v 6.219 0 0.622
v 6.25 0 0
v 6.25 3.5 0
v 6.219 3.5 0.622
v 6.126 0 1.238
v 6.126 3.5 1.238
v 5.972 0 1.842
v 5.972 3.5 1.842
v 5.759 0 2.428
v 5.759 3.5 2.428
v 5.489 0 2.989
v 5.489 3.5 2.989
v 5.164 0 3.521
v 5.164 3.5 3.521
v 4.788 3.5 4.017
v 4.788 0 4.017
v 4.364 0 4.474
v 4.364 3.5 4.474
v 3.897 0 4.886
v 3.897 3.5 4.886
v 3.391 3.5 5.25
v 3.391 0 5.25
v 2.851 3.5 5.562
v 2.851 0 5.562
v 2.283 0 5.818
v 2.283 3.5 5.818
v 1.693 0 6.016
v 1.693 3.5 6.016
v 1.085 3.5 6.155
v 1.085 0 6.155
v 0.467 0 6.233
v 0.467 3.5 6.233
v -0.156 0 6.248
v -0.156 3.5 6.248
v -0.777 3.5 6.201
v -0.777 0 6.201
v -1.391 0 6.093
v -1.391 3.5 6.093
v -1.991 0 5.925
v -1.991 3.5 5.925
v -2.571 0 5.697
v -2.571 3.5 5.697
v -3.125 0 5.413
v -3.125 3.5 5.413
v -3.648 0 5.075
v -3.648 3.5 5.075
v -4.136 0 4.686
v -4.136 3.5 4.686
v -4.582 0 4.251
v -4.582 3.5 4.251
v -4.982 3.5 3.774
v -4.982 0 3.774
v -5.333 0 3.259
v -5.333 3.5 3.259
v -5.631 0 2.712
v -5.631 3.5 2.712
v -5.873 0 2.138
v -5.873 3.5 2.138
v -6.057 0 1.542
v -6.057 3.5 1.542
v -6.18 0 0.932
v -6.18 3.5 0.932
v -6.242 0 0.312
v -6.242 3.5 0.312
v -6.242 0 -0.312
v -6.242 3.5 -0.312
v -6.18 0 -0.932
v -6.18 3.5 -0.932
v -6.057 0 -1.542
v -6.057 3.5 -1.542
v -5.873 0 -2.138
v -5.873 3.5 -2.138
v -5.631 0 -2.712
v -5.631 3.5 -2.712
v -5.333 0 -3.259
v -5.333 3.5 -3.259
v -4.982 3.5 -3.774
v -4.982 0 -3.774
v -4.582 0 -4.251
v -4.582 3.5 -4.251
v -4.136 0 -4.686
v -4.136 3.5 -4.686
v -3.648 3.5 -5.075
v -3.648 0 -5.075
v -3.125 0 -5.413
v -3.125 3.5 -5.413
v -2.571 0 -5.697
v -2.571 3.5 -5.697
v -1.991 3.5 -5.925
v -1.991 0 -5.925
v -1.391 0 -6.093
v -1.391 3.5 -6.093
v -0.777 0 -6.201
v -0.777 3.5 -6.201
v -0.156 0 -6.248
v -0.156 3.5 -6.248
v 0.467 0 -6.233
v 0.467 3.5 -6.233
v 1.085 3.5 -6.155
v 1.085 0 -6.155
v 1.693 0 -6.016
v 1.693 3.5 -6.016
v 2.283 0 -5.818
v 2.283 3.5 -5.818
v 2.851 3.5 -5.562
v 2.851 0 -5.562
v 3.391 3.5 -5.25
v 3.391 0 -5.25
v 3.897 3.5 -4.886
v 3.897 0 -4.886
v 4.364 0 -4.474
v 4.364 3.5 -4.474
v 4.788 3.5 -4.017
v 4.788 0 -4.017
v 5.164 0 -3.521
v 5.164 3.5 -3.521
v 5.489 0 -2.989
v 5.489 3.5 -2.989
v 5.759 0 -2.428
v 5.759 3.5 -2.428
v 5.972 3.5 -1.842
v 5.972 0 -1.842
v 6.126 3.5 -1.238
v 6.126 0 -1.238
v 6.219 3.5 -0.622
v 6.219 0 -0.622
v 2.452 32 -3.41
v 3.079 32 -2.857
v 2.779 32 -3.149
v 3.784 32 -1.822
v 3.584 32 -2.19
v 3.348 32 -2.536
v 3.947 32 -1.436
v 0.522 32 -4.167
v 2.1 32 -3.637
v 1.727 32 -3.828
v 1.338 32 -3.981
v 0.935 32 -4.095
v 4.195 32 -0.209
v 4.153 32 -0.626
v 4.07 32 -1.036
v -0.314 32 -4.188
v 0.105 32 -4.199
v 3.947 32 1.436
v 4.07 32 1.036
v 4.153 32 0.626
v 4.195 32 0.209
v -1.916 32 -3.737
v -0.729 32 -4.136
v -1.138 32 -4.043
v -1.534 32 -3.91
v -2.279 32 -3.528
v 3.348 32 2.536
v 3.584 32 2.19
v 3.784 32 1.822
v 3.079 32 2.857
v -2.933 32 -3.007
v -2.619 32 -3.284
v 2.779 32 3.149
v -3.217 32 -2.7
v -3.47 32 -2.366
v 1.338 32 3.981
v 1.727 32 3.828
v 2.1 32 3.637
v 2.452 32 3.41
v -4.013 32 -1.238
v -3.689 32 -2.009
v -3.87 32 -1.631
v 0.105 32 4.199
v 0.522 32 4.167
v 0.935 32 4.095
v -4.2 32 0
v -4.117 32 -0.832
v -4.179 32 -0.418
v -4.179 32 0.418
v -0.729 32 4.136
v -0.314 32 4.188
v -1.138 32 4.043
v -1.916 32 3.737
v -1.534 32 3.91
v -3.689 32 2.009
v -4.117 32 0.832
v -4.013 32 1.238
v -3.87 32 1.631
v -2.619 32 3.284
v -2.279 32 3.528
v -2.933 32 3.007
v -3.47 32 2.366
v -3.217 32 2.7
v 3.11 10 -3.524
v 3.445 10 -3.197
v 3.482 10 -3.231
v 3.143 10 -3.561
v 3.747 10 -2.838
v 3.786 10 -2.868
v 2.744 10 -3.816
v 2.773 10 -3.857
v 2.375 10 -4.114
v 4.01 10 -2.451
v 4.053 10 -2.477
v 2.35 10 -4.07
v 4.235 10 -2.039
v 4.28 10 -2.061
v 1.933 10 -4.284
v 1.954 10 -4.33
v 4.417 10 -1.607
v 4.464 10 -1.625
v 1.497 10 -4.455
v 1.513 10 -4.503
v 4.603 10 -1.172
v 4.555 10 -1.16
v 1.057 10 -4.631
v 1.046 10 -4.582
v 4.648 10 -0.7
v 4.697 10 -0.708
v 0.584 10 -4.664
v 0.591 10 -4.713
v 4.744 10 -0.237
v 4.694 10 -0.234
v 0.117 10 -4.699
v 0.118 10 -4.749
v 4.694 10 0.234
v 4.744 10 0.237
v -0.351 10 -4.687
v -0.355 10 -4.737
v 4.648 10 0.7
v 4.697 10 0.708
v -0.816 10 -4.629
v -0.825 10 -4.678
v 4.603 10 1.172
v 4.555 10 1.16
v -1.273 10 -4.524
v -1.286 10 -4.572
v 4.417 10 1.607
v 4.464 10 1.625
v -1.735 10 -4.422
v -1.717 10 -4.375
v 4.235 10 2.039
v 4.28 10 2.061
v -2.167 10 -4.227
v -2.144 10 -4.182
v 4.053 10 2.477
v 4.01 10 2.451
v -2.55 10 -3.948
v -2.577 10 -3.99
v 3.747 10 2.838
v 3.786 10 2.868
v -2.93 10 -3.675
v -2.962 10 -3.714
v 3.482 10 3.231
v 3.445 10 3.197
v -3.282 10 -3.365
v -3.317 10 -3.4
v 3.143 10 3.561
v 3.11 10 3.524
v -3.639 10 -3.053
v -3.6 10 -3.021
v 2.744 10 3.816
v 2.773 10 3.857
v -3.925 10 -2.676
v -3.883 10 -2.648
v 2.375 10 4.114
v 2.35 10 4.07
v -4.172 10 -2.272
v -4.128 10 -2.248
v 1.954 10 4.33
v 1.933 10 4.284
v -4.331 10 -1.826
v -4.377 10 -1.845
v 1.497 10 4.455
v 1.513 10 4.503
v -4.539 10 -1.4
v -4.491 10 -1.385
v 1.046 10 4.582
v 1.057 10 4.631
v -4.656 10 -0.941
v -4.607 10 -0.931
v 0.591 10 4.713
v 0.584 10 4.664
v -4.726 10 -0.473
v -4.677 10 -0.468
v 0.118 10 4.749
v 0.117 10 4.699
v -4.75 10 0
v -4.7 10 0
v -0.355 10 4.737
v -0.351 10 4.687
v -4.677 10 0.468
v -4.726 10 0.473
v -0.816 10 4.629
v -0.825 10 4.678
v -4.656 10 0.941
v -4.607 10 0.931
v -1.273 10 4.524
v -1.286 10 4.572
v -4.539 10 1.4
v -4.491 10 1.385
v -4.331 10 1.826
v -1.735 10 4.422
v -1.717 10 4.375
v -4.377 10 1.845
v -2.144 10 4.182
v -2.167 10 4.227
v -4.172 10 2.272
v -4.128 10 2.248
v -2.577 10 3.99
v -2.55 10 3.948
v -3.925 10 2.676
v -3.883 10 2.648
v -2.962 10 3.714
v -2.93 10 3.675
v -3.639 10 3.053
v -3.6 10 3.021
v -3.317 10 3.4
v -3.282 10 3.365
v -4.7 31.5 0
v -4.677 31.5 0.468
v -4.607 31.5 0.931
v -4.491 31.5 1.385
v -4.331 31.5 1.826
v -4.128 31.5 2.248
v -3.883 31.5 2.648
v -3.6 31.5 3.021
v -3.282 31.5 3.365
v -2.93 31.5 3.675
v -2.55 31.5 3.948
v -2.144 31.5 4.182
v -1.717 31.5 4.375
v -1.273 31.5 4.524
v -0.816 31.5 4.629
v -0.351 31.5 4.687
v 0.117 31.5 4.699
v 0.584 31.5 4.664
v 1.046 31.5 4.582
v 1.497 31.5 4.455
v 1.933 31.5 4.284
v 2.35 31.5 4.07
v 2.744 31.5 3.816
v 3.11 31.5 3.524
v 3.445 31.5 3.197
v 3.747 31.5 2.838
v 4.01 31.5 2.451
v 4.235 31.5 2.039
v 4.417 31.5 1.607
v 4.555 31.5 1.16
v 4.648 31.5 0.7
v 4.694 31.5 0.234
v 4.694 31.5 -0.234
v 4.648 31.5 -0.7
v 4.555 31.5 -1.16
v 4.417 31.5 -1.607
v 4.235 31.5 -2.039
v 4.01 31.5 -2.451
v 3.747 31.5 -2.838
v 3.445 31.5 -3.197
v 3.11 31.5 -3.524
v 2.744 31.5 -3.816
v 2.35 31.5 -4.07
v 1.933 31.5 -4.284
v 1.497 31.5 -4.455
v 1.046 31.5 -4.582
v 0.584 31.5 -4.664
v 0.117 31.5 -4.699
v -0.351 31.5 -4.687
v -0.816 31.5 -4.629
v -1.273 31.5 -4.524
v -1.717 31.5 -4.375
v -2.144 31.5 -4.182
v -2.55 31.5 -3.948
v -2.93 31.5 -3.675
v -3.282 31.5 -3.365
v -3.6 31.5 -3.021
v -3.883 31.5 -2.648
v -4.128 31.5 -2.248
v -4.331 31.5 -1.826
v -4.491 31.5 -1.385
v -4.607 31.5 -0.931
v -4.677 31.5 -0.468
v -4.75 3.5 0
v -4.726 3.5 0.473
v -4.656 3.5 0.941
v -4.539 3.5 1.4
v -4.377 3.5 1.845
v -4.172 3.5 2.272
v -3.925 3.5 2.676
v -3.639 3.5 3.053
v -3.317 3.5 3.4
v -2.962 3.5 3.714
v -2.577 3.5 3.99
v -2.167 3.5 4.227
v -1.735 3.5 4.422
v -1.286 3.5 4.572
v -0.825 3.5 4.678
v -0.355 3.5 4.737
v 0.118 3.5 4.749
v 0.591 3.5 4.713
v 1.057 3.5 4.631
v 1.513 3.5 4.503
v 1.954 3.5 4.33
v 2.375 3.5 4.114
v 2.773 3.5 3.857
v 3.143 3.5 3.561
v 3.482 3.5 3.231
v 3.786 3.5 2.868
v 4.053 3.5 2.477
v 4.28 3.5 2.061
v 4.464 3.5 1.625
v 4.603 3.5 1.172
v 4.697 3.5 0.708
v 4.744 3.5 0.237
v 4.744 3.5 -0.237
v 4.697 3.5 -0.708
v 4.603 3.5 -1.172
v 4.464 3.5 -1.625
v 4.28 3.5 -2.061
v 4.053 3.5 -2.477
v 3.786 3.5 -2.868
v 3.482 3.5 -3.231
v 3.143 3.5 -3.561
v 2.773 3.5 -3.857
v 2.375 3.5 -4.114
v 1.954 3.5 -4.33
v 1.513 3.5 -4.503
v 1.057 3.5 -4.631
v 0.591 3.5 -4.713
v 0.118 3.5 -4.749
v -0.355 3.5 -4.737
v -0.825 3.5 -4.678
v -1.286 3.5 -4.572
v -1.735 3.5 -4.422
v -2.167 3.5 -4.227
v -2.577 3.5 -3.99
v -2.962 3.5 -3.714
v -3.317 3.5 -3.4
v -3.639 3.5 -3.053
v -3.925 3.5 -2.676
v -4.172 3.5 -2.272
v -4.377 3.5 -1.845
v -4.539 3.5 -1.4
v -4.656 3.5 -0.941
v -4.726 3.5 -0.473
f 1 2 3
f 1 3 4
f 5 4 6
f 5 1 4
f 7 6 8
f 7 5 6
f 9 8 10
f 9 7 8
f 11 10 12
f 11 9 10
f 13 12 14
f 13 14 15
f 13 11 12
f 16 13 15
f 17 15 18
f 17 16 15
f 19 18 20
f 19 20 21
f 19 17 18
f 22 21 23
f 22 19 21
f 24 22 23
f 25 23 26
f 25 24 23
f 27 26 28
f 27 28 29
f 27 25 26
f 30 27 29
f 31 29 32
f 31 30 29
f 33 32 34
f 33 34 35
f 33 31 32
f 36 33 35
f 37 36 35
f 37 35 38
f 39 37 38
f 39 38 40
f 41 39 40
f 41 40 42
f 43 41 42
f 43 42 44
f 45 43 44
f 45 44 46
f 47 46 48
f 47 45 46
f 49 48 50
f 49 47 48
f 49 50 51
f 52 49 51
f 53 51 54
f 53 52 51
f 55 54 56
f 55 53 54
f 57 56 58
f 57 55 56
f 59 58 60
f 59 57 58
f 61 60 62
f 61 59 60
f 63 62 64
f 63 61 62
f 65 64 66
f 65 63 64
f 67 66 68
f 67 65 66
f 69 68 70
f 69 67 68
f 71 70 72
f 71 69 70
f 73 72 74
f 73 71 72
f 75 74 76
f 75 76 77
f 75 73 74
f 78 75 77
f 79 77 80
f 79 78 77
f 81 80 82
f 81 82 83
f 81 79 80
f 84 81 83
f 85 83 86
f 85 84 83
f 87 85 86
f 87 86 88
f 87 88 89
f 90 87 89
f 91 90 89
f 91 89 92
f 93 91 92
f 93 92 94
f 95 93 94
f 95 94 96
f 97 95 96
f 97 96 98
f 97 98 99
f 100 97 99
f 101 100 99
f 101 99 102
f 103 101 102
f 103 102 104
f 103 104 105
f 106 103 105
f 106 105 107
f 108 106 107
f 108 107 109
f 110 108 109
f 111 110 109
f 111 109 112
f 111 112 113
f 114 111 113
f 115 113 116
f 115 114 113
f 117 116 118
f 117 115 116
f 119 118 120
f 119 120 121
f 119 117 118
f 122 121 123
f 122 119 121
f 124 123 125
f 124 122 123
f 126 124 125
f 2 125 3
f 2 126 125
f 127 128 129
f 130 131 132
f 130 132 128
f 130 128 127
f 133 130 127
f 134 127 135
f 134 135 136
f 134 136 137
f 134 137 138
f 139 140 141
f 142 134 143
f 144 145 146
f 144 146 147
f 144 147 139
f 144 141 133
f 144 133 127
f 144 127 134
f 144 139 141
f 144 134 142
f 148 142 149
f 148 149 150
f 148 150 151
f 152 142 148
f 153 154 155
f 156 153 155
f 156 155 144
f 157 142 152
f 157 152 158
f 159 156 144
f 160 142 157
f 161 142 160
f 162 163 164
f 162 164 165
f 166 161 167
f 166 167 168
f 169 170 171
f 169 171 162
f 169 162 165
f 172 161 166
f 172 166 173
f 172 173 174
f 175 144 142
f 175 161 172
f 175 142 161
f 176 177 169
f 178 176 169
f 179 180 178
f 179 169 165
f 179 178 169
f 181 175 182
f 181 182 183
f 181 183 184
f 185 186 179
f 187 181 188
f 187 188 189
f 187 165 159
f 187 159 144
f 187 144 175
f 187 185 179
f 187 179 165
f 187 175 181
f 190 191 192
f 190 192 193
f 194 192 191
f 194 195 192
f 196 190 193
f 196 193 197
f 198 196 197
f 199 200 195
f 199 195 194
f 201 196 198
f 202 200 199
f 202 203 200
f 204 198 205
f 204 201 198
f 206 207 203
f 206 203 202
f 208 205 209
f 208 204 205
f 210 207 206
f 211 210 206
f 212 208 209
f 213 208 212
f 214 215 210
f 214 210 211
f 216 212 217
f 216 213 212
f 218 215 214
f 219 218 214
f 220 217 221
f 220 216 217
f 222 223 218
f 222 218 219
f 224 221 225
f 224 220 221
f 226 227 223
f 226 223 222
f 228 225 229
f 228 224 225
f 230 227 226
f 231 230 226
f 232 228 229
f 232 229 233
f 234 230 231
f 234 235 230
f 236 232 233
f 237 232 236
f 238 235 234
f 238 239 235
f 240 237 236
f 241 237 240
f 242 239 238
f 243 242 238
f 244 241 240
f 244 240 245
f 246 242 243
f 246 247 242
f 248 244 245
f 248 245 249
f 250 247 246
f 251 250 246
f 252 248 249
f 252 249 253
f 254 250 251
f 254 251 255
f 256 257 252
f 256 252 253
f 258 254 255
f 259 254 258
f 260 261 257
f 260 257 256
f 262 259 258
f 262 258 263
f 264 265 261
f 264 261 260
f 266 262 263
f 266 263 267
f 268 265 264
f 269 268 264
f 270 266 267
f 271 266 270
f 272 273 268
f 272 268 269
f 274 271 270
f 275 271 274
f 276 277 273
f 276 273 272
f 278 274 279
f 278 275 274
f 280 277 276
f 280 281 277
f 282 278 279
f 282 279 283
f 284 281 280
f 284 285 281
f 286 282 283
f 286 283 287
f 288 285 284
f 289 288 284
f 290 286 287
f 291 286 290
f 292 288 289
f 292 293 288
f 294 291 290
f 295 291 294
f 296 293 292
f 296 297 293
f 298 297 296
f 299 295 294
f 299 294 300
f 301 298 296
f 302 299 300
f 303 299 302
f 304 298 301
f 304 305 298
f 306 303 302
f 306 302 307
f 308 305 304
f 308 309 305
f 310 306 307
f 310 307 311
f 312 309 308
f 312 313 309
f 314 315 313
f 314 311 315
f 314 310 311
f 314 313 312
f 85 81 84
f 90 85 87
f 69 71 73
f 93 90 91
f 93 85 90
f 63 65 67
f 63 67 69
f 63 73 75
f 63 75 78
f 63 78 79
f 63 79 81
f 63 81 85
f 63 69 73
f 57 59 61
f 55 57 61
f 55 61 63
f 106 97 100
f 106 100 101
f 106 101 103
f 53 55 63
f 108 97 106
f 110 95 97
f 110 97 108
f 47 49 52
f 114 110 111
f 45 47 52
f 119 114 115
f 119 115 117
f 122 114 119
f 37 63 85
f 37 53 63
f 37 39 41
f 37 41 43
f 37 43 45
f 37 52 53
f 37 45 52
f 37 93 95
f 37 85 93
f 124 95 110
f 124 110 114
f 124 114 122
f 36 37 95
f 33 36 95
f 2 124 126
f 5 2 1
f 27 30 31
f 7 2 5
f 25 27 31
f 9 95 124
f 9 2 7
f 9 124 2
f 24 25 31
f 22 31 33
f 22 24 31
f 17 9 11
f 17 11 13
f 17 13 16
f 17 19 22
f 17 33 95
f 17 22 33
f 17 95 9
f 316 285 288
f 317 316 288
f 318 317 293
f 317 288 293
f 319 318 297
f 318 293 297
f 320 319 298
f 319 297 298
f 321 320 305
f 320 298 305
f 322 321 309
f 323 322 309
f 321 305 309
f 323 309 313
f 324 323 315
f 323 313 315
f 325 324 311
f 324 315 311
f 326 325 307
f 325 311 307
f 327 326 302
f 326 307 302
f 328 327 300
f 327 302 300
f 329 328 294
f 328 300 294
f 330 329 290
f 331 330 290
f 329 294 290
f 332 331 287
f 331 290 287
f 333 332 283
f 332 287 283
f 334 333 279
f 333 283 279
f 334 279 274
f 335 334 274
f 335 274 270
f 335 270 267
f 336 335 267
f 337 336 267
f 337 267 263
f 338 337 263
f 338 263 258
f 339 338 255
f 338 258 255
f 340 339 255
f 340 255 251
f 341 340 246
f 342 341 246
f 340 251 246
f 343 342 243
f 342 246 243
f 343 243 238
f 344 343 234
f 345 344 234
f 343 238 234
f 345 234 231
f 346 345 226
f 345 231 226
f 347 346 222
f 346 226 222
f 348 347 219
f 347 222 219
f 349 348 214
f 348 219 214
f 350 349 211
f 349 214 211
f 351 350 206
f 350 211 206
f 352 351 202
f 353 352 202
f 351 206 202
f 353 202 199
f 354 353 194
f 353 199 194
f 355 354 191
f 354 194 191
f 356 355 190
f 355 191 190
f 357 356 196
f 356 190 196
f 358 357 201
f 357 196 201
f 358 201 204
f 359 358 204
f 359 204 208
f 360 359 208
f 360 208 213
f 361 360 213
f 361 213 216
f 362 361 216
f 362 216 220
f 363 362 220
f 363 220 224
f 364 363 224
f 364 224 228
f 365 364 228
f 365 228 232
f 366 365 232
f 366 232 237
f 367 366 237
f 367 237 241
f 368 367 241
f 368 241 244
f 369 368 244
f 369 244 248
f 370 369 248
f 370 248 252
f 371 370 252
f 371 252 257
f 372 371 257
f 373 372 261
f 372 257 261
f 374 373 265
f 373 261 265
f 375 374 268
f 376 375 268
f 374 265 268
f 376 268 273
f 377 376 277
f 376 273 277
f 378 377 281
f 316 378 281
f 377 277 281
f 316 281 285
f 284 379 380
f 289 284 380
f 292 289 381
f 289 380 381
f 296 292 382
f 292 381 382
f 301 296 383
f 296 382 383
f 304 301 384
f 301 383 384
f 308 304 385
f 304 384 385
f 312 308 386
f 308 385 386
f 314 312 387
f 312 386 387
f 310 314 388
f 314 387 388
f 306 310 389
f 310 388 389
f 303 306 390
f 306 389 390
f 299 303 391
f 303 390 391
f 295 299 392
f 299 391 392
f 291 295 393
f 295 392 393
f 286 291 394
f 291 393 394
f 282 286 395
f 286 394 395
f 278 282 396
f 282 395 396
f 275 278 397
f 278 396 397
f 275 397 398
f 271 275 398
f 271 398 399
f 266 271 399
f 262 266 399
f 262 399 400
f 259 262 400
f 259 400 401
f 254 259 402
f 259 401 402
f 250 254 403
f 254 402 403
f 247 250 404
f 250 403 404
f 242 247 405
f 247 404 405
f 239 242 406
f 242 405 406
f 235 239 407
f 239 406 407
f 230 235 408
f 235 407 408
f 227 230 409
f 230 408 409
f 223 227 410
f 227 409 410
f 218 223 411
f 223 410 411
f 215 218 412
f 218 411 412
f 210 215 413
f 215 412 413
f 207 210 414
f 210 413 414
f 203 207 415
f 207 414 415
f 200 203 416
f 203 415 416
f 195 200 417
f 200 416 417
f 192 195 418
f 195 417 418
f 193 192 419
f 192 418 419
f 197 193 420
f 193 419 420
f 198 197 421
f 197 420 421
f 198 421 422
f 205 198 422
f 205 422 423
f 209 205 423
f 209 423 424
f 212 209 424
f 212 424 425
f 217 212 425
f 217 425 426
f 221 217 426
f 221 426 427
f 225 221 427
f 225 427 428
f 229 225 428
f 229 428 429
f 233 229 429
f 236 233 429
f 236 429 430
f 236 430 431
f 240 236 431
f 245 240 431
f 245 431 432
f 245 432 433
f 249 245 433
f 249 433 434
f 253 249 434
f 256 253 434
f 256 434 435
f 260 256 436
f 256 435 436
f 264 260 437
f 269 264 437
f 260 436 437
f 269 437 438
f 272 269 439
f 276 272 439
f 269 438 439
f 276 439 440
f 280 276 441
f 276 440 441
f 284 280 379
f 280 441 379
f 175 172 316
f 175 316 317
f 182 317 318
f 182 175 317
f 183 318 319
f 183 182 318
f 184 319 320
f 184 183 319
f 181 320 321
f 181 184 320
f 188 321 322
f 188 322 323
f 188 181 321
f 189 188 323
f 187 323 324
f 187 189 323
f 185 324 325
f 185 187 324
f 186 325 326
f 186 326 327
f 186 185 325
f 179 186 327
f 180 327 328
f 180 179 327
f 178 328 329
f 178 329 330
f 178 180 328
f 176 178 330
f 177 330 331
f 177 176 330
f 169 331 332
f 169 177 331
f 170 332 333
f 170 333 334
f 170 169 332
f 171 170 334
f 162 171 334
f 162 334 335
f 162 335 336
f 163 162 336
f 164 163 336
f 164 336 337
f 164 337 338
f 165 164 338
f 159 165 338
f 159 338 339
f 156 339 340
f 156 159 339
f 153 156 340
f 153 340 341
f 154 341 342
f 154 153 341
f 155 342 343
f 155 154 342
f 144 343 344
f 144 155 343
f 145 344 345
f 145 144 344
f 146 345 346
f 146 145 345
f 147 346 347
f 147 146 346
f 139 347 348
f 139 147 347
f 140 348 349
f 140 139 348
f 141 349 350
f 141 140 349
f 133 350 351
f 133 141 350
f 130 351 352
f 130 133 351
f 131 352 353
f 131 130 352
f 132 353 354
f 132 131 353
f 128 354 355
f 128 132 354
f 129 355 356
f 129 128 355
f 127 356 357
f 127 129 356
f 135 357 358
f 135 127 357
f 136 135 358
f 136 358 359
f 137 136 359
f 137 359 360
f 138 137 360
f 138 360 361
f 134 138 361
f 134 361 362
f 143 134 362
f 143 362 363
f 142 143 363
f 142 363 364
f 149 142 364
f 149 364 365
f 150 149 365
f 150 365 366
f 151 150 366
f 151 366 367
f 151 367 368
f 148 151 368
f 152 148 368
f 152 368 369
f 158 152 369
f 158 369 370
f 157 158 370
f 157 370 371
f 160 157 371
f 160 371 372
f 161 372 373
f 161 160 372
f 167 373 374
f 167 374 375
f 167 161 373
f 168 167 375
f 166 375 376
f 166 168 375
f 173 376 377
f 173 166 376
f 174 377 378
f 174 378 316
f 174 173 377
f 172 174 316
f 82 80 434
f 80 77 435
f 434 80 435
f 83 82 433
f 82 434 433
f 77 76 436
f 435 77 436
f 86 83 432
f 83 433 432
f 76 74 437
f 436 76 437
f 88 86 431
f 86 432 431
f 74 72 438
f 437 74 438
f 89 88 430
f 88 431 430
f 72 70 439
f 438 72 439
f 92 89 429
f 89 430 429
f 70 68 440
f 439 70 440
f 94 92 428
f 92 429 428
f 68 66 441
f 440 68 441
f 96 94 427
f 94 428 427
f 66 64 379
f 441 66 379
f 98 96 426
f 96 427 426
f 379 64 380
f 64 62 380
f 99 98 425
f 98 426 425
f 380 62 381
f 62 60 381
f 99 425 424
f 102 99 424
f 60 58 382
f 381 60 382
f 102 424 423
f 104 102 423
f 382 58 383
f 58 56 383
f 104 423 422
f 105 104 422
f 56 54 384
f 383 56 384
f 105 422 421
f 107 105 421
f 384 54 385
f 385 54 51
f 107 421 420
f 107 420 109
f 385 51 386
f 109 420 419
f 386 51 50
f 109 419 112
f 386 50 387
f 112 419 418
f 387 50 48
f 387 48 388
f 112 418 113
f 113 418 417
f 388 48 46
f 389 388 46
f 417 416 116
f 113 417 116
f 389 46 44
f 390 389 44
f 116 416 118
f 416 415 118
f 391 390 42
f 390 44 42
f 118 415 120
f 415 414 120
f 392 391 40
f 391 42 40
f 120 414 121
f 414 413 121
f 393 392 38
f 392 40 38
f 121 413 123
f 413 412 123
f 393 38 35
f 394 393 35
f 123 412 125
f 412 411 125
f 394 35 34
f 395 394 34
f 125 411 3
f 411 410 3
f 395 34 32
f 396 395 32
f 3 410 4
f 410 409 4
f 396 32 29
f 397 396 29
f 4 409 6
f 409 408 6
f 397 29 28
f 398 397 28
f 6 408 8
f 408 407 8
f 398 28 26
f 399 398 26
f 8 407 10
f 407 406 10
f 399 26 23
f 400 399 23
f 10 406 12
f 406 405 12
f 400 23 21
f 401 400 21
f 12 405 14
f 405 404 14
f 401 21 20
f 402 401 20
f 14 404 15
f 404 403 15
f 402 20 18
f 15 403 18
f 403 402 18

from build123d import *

# Parameters (mm, degrees)
F0_R     = 6.25
F1_DEPTH = 3.5
F2_R     = 4.75
F3_DEPTH = 6.5
F4_R     = 4.7
F5_DEPTH = 22
F6_SIZE  = 0.5


with BuildPart() as f1:
    # F0 (on Front) → F1 (new body)
    with BuildSketch(Plane.XZ):
        Circle(F0_R)
    extrude(amount=-F1_DEPTH)

    # F2 (on face) → F3 (join)
    with BuildSketch(Plane(origin=(0, 3.5, 0), x_dir=(-1, 0, 0), z_dir=(0, 1, 0))):
        Circle(F2_R)
    extrude(amount=F3_DEPTH)

    # F4 (on face) → F5 (join)
    with BuildSketch(Plane(origin=(0, 10, 0), x_dir=(-1, 0, 0), z_dir=(0, 1, 0))):
        Circle(F4_R)
    extrude(amount=F5_DEPTH)

    # F6
    f6_edges = [f1.edges().sort_by_distance(p)[0] for p in [
        (4.7, 32, 0),
    ]]
    chamfer(f6_edges, length=F6_SIZE)


solid = f1.part
